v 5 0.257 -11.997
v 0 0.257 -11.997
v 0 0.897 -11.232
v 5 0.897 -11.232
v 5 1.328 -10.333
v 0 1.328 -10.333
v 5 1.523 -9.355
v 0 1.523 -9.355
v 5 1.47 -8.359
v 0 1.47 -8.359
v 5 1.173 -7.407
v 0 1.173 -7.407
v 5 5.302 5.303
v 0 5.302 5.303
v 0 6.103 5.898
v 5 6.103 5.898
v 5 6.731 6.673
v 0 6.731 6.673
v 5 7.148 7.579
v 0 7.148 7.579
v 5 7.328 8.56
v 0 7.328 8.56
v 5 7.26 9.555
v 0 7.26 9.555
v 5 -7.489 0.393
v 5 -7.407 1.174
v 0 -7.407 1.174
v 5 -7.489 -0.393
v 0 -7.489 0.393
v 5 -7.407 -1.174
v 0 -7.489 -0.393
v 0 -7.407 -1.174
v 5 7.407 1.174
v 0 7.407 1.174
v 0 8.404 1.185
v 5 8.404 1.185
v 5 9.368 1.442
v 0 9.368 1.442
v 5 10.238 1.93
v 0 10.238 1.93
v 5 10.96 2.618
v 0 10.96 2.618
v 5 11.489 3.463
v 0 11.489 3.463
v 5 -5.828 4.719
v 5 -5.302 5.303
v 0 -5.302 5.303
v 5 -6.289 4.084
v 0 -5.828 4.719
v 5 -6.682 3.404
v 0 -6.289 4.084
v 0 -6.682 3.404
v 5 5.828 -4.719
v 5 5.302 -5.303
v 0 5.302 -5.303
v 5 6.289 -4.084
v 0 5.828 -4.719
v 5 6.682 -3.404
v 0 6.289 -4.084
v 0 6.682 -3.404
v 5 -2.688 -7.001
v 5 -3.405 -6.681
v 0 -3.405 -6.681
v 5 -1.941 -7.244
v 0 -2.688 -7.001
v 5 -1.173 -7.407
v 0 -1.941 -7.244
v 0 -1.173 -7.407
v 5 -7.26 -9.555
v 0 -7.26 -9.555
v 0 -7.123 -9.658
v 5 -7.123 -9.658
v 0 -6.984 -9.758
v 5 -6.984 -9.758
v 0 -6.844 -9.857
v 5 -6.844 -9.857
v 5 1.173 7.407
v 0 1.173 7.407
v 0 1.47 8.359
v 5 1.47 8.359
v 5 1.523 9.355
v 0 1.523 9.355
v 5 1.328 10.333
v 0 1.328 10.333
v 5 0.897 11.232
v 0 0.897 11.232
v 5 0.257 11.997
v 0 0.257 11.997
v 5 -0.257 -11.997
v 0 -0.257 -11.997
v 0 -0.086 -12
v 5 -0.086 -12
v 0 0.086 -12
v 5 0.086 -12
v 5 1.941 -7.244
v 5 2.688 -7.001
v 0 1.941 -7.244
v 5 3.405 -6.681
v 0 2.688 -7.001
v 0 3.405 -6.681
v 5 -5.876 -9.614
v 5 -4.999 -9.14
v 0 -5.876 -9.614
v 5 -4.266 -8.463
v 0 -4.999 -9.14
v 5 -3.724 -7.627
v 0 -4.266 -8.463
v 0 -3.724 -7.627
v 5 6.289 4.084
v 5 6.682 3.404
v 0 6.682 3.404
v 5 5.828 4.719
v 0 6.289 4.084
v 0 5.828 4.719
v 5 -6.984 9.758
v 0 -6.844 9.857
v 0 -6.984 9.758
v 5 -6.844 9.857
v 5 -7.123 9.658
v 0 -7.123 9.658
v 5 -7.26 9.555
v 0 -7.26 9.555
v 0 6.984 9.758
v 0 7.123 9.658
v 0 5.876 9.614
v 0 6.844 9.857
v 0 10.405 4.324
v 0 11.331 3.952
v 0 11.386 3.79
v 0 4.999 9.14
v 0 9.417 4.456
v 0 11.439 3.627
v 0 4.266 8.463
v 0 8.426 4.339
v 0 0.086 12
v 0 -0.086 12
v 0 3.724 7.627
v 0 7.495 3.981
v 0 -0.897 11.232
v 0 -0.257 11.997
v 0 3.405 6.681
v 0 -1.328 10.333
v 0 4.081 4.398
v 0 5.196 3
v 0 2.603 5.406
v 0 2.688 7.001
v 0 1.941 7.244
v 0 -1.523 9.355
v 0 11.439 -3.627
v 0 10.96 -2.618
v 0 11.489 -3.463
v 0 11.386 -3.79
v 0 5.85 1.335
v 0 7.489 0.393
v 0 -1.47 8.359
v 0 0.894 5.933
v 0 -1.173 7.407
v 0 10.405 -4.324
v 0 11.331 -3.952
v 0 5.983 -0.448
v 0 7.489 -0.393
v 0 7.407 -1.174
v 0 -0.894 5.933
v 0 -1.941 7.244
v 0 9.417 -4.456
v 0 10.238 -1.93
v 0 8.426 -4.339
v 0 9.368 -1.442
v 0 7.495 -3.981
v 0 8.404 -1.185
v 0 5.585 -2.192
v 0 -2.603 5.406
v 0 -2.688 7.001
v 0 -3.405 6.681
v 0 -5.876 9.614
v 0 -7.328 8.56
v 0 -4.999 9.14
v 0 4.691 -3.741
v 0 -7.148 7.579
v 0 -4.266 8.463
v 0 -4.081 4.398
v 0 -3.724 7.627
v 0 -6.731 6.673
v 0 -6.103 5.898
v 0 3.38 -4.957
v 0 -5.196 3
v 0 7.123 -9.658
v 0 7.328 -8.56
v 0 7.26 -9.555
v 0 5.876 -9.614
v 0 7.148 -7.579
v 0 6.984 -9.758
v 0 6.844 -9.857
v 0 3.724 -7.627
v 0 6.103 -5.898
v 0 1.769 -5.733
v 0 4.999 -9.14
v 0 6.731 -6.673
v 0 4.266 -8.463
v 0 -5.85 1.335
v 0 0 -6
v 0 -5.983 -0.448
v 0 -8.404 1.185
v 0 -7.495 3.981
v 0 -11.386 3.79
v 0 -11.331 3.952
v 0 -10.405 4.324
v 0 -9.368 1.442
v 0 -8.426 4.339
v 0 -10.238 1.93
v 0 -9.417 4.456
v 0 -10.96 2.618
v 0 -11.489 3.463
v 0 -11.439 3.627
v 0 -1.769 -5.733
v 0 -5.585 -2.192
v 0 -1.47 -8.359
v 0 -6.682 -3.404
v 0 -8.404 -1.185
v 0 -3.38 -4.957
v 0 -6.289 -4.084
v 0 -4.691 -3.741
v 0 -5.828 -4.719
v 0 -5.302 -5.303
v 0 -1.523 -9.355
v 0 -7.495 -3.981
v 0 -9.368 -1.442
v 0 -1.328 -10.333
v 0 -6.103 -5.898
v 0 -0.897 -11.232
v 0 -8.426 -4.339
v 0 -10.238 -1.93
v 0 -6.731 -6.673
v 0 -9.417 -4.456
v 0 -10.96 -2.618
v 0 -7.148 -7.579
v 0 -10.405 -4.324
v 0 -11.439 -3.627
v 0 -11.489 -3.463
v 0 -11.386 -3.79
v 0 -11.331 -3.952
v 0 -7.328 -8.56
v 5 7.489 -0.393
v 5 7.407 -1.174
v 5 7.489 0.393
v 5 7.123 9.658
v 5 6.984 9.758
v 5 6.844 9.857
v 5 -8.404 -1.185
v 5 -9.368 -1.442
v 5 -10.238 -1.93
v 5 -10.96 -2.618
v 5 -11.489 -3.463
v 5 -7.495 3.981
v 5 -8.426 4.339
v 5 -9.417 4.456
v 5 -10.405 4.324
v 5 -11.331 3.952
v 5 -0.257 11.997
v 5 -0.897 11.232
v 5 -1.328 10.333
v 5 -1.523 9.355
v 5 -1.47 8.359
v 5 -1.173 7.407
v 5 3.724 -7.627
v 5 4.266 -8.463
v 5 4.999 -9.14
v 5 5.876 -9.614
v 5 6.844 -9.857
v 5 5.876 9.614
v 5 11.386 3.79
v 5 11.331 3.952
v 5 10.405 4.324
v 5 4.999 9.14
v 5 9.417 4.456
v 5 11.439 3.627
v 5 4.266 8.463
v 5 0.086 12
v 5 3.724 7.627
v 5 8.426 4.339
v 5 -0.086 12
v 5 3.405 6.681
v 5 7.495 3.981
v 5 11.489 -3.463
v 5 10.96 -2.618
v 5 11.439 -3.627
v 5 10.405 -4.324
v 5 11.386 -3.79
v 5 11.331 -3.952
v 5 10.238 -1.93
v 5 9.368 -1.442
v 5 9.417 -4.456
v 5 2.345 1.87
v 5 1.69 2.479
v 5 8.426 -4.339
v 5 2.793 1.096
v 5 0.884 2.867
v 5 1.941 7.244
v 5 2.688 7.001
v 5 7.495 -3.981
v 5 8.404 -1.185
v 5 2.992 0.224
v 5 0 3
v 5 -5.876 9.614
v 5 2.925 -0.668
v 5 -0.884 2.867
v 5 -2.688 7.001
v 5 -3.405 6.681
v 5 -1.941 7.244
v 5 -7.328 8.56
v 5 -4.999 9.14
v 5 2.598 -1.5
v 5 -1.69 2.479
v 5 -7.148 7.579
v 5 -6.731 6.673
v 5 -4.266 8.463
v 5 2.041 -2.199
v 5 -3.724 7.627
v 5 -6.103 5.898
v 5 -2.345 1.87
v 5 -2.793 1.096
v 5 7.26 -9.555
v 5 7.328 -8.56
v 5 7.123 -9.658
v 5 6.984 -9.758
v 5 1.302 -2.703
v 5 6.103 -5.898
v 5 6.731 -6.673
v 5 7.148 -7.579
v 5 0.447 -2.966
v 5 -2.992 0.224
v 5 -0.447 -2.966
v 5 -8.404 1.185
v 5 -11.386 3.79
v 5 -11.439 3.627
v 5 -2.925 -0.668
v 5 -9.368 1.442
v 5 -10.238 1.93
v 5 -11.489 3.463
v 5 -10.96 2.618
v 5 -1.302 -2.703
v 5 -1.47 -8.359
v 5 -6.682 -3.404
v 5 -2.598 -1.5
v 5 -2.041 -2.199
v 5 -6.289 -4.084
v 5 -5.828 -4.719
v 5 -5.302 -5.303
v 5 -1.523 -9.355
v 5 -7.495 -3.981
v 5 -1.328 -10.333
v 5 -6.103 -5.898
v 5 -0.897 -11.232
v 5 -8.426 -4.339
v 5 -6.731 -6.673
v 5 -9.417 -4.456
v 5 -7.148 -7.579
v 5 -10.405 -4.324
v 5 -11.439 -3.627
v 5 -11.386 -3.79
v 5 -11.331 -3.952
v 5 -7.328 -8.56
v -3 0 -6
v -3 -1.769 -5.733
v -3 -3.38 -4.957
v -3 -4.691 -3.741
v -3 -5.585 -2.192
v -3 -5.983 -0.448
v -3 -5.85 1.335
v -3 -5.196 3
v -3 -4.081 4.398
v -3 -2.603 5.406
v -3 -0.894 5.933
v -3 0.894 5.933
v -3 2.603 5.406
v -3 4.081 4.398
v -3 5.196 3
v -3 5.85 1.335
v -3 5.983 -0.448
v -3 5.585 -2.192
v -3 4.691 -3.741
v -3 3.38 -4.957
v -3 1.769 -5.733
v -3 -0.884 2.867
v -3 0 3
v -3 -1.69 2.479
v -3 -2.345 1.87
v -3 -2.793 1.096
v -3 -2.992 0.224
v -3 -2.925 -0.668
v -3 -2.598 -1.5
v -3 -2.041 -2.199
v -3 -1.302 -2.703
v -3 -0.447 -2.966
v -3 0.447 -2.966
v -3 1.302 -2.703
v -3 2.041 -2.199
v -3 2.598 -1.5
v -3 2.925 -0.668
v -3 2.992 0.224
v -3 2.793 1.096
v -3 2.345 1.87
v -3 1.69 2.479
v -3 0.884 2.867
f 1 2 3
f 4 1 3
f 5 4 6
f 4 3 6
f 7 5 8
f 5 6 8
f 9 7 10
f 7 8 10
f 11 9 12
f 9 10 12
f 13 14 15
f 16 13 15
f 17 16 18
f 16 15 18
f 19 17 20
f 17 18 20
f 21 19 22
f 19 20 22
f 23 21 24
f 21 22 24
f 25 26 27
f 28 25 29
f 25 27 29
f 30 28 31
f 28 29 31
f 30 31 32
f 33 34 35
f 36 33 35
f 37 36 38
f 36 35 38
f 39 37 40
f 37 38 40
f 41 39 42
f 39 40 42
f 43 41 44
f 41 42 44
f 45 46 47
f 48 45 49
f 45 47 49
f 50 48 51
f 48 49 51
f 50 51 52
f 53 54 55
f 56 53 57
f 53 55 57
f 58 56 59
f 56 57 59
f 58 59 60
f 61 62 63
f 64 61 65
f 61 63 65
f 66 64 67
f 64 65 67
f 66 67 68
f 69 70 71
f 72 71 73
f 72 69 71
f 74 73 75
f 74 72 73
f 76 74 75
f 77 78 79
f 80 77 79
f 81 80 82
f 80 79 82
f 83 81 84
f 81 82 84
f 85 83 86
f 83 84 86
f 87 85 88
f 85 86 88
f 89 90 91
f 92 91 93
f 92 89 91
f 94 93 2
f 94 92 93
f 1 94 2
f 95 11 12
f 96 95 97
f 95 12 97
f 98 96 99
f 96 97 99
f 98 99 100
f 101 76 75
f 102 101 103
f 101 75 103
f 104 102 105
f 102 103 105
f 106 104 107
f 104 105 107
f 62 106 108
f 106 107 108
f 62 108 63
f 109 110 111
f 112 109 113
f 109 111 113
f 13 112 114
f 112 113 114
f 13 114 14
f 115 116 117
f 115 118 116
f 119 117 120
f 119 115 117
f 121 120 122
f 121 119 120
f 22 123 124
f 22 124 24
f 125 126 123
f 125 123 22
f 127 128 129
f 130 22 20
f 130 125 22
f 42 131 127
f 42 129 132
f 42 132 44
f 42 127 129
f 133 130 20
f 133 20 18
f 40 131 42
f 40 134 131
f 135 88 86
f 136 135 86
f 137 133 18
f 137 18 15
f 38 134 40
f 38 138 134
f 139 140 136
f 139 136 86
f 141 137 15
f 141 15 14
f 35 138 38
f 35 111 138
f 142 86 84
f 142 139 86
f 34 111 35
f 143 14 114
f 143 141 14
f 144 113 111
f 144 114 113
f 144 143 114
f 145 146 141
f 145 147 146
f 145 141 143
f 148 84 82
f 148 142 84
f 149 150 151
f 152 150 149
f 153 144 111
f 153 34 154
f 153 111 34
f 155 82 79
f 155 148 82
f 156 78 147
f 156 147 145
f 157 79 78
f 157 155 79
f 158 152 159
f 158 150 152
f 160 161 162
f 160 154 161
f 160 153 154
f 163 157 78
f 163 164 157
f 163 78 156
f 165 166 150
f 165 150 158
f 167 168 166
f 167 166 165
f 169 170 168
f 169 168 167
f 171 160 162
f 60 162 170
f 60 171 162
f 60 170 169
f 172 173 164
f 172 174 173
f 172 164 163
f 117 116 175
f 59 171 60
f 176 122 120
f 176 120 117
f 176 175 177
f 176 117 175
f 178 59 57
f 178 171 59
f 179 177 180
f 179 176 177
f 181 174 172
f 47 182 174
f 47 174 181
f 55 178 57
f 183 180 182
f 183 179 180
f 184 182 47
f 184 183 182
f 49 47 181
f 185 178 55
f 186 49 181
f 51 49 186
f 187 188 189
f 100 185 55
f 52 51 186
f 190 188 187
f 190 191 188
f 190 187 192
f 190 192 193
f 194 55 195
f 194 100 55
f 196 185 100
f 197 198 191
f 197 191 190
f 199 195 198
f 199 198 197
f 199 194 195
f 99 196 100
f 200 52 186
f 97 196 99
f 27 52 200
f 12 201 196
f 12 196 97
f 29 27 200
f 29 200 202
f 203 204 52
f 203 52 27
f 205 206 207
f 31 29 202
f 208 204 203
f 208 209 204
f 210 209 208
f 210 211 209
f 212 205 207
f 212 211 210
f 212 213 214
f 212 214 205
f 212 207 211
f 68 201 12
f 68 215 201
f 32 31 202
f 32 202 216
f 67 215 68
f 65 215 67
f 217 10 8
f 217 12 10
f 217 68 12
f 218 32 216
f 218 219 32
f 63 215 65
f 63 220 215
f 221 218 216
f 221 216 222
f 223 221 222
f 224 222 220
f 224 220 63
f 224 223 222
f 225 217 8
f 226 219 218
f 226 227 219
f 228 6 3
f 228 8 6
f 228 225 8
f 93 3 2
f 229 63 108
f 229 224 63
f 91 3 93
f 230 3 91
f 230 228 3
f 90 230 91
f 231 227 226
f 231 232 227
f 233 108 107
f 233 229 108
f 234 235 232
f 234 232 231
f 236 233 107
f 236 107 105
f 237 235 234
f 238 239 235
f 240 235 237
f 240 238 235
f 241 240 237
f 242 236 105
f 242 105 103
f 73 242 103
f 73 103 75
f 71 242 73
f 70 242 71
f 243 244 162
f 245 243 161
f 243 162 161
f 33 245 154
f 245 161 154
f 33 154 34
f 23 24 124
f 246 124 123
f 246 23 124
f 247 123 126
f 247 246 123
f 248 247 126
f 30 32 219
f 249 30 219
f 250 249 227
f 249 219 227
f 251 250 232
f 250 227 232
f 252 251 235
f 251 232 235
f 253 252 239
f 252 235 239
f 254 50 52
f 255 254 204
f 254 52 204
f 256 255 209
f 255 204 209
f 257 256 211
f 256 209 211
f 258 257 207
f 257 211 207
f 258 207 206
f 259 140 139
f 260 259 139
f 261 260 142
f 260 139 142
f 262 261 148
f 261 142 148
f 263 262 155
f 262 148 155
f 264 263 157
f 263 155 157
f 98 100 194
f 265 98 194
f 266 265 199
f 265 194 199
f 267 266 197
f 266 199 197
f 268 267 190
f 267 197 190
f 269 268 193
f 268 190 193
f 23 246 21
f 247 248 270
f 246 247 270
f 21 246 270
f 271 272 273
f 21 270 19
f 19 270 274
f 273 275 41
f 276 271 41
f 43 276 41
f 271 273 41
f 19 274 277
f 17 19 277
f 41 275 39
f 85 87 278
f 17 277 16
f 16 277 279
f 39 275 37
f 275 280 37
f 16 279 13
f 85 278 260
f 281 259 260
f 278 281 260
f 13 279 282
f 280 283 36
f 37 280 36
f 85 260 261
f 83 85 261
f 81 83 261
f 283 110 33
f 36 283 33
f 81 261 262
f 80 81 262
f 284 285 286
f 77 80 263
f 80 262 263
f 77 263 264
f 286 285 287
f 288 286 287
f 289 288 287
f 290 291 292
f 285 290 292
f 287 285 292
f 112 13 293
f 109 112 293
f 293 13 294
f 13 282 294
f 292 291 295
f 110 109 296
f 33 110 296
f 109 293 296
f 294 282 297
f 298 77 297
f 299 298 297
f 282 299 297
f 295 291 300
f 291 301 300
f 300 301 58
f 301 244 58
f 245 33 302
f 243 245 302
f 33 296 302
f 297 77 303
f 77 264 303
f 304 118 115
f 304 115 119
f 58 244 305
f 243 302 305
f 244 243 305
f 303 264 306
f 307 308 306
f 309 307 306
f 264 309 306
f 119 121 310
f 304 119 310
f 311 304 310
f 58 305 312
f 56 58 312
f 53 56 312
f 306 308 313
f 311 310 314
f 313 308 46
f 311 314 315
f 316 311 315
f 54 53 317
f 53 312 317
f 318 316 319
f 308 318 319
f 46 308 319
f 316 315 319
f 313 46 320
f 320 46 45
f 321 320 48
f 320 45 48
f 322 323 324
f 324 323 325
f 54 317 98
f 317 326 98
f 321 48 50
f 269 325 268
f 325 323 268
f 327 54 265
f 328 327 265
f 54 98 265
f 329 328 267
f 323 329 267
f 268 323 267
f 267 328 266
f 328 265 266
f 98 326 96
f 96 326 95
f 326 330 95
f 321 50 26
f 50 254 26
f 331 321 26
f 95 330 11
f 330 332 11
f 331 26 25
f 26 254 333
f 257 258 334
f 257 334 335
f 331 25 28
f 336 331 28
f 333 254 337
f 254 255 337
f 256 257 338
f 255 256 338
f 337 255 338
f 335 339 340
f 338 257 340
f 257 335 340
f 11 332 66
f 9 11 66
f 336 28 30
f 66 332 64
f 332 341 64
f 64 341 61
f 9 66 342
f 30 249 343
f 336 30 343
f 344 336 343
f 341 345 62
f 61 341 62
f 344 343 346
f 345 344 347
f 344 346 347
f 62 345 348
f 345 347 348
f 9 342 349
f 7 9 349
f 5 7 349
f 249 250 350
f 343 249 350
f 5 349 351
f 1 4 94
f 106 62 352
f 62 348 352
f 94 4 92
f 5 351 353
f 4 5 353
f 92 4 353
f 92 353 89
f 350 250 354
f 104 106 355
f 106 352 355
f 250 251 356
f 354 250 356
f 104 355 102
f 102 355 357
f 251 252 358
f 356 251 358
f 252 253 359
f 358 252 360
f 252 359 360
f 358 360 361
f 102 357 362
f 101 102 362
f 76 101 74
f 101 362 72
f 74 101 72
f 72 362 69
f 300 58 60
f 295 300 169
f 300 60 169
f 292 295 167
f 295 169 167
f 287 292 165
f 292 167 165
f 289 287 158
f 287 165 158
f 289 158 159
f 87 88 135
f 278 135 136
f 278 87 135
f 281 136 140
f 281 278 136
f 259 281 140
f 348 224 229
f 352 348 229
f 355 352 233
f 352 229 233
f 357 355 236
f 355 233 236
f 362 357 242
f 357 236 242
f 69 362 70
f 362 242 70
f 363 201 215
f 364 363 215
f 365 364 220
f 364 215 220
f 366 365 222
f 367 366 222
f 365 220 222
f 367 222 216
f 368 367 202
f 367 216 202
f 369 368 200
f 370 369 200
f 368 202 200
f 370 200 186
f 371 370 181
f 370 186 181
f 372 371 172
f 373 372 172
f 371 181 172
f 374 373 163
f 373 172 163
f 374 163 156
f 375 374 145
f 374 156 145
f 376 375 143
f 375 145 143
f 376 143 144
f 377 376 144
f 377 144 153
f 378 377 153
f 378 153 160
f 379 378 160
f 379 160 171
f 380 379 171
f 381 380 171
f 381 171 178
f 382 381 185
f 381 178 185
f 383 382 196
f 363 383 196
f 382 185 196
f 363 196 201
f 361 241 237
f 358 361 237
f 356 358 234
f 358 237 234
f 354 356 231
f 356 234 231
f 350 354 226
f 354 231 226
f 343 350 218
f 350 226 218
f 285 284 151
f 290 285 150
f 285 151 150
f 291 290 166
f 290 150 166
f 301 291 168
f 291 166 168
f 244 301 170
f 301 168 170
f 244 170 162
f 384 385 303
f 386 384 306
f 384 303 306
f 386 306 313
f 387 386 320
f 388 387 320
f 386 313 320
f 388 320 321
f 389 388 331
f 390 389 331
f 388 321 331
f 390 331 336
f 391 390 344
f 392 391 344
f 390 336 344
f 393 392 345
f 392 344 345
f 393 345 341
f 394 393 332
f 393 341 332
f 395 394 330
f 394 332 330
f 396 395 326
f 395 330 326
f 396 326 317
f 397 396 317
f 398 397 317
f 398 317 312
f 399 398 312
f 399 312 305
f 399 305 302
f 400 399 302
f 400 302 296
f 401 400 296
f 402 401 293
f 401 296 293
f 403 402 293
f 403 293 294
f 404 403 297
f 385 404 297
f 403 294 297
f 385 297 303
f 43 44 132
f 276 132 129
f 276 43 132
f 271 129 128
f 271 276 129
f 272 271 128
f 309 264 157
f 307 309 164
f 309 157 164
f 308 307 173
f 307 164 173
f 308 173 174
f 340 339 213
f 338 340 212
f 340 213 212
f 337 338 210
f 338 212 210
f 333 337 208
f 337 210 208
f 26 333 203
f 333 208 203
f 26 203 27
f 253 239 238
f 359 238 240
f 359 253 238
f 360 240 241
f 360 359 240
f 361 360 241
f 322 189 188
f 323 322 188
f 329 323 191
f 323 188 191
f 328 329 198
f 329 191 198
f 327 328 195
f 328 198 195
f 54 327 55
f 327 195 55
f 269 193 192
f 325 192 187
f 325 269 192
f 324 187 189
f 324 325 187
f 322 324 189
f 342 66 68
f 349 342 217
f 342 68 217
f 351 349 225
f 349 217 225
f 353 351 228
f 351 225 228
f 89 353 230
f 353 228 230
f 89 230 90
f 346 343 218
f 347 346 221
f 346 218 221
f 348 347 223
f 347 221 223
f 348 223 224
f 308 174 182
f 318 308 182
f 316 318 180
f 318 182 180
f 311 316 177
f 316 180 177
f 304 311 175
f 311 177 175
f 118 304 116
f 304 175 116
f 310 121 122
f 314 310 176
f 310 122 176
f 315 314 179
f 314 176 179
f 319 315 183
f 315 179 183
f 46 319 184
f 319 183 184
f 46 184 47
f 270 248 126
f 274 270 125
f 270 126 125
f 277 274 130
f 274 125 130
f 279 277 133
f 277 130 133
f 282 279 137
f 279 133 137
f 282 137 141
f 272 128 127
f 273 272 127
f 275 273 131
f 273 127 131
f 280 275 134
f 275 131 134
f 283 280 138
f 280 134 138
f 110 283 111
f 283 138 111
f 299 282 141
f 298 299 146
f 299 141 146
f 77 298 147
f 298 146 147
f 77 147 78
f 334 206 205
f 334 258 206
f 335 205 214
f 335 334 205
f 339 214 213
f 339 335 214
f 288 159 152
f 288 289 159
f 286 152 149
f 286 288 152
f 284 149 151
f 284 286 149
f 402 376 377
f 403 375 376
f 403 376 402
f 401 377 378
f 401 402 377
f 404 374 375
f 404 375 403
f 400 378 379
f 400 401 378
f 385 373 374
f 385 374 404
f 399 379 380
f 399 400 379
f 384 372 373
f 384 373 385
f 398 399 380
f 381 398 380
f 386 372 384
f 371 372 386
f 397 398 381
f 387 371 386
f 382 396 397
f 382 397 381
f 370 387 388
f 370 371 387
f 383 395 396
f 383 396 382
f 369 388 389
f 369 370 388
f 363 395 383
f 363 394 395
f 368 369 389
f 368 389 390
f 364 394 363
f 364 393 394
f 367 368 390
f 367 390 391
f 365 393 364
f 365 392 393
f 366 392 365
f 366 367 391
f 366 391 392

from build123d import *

# Parameters (mm, degrees)
BASPROSKE_W      = 5
BASPROSKE_H      = 12
TOOTHCUT_DEPTH   = 18.691806013
TEETHCUTS_COUNT  = 10
TEETHCUTS_ANGLE  = 324
HUBNEAONESKE_R   = 6
HUBNEARONE_DEPTH = 3.0000508
BORSKE_R         = 3
BORE_DEPTH       = 8.0000508


with BuildPart() as part:
    # BasProSke → Base-Revolve (revolve)
    with BuildSketch(Plane(origin=(0, 0, 0), x_dir=(1, 0, 0), z_dir=(0, 1, 0)), mode=Mode.PRIVATE) as base_revolve_sk:
        with Locations((2.5, 6)):
            Rectangle(BASPROSKE_W, BASPROSKE_H)
    revolve(base_revolve_sk.sketch.rotate(Axis((-10, 0, 0), (1, 0, 0)), 180), axis=Axis((-10, 0, 0), (1, 0, 0)))

    # TooCutSke → ToothCut (cut, through all)
    with BuildSketch(Plane(origin=(0, 0, 0), x_dir=(0, 0, -1), z_dir=(1, 0, 0))):
        with BuildLine():
            ThreePointArc((1.173662691, 7.406586048), (0, 7.499), (-1.173662691, 7.406586048))
            ThreePointArc((-1.173662691, 7.406586048), (-1.668191438, 9.834565786), (-3.497907776, 11.50542856))
            ThreePointArc((-3.497907776, 11.50542856), (0, 12.0254), (3.497907776, 11.50542856))
            ThreePointArc((3.497907776, 11.50542856), (1.668191438, 9.834565786), (1.173662691, 7.406586048))
        make_face()
    toothcut = extrude(amount=TOOTHCUT_DEPTH, mode=Mode.SUBTRACT)

    # TeethCuts: ToothCut ×10 about axis
    teethcuts_axis = Axis((-10, 0, 0), (1, 0, 0))
    for i in range(1, TEETHCUTS_COUNT):
        add(toothcut.rotate(teethcuts_axis, i * TEETHCUTS_ANGLE / (TEETHCUTS_COUNT - 1)), mode=Mode.SUBTRACT)

    # HubNeaOneSke → HubNearOne (add)
    with BuildSketch(Plane.ZY):
        with Locations(Location((0, 0, 0), (0, 0, 180))):
            Circle(HUBNEAONESKE_R)
    extrude(amount=HUBNEARONE_DEPTH)

    # BorSke → Bore (cut, symmetric)
    with BuildSketch(Plane(origin=(0, 0, 0), x_dir=(0, 0, -1), z_dir=(1, 0, 0))):
        with Locations(Location((0, 0, 0), (0, 0, 180))):
            Circle(BORSKE_R)
    extrude(amount=BORE_DEPTH, both=True, mode=Mode.SUBTRACT)


solid = part.part
